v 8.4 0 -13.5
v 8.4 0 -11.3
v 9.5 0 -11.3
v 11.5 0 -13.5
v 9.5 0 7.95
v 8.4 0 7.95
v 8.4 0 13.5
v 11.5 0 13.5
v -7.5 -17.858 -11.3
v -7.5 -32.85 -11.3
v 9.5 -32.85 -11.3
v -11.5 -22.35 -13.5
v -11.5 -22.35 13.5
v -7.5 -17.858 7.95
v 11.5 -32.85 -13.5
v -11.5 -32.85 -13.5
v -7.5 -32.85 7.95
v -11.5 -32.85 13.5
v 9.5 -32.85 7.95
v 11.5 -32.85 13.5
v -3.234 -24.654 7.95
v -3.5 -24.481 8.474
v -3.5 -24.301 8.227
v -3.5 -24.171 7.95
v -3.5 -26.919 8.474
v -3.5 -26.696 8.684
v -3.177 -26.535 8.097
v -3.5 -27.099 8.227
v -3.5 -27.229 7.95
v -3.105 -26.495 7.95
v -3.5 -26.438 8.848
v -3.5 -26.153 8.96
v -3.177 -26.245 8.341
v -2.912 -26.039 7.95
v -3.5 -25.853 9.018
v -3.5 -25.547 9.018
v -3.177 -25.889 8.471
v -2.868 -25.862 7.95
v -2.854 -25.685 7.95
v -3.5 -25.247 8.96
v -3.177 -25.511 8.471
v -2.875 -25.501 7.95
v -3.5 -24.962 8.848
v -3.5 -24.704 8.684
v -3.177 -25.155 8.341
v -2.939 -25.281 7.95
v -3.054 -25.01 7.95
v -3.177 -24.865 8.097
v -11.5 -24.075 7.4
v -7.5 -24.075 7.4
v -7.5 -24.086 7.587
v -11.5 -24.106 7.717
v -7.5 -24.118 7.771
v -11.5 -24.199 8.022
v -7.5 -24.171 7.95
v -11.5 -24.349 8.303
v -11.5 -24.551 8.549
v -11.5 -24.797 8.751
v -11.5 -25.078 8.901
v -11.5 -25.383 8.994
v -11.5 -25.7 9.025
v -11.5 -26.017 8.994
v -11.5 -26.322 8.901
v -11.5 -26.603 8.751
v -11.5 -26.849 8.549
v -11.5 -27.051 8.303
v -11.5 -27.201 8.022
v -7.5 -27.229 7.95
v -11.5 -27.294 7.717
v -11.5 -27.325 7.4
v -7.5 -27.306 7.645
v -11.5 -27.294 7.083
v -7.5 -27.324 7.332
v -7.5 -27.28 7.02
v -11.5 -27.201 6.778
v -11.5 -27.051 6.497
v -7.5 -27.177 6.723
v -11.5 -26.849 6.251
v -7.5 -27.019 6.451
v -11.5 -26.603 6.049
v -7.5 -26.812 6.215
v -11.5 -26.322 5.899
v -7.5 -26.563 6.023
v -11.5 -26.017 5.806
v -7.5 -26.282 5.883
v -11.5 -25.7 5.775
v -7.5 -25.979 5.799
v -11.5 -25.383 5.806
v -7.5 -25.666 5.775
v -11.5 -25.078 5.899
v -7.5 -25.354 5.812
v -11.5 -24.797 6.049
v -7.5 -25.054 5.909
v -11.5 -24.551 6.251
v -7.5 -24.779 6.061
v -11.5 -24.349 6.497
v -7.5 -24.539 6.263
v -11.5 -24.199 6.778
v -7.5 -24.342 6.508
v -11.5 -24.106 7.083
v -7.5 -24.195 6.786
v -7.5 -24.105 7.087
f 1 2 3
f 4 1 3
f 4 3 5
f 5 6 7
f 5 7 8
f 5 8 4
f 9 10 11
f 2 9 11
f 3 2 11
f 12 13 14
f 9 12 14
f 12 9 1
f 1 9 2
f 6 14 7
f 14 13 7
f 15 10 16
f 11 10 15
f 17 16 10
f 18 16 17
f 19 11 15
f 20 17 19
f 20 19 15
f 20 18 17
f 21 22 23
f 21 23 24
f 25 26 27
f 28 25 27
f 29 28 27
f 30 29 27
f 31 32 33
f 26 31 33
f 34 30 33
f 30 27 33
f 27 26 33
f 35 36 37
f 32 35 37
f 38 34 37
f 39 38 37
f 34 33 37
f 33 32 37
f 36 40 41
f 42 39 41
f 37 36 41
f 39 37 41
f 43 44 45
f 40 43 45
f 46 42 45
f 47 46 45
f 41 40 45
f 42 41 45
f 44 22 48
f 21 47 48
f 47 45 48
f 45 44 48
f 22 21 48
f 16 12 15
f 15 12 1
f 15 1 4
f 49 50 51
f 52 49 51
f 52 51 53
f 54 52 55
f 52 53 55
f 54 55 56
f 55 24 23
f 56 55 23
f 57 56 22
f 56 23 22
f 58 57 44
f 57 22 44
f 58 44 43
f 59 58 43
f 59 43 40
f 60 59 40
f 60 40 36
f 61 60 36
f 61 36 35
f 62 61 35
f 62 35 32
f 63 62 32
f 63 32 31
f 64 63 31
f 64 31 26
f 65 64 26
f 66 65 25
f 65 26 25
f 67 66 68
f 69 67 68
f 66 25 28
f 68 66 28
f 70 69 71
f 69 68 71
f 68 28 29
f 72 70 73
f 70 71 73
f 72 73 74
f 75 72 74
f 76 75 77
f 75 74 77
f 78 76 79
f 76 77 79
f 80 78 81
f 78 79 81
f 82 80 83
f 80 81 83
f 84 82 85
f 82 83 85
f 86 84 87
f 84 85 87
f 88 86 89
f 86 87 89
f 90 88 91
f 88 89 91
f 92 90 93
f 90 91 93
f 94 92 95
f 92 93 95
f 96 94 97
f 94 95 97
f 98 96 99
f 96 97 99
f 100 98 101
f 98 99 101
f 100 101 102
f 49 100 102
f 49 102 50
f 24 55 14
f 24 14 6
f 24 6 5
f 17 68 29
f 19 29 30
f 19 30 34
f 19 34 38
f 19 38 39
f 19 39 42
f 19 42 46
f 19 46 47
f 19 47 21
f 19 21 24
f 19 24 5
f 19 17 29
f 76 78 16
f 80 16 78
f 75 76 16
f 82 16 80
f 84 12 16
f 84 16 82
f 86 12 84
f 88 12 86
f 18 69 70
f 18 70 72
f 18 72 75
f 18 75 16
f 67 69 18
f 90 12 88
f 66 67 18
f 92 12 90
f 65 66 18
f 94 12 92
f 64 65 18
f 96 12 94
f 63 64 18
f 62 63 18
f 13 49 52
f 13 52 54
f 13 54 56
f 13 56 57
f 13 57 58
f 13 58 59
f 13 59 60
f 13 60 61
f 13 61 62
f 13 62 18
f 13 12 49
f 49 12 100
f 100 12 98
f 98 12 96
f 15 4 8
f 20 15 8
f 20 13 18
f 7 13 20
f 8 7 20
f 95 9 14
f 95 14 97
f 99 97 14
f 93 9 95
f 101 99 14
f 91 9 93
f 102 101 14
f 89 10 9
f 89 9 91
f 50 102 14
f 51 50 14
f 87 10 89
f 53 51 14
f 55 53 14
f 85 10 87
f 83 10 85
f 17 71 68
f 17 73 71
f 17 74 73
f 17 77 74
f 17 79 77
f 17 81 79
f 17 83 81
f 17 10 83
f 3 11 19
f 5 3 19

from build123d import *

# Parameters (mm, degrees)
F0_W     = 23
F0_H     = 27
F1_DEPTH = 32.85
F2_W     = 17
F2_H     = 19.25
F3_DEPTH = 32.851
F5_DEPTH = 27.001
F7_D     = 3.25
F7_DEPTH = 8
F7_TIP   = 0.9763985059


# Not quite as in the source:
# - a feature names something its author has since deleted; it is built from what else it names


with BuildPart() as f1:
    # F0 (on Front) → F1 (new body)
    with BuildSketch(Plane.XZ):
        Rectangle(F0_W, F0_H)
    extrude(amount=F1_DEPTH)

    # F2 (on face) → F3 (cut, through all)
    with BuildSketch(Plane.XZ.offset(32.85)):
        with Locations((1, -1.675)):
            Rectangle(F2_W, F2_H)
    extrude(amount=-F3_DEPTH, mode=Mode.SUBTRACT)

    # F4 (on face) → F5 (cut, through all)
    with BuildSketch(Plane.XY.offset(13.5)):
        Polygon((-11.5, -22.35), (8.4, 0), (-11.5, 0), align=None)
    extrude(amount=-F5_DEPTH, mode=Mode.SUBTRACT)

    # F7
    with Locations(Plane(origin=(-11.5, 0, 0), x_dir=(0, -1, 0), z_dir=(-1, 0, 0))):
        with Locations((25.7, 7.4)):
            Hole(F7_D / 2, depth=F7_DEPTH)
            with Locations((0, 0, -(F7_DEPTH + F7_TIP / 2))):  # 118° drill point
                Cone(0, F7_D / 2, F7_TIP, mode=Mode.SUBTRACT)


solid = f1.part
